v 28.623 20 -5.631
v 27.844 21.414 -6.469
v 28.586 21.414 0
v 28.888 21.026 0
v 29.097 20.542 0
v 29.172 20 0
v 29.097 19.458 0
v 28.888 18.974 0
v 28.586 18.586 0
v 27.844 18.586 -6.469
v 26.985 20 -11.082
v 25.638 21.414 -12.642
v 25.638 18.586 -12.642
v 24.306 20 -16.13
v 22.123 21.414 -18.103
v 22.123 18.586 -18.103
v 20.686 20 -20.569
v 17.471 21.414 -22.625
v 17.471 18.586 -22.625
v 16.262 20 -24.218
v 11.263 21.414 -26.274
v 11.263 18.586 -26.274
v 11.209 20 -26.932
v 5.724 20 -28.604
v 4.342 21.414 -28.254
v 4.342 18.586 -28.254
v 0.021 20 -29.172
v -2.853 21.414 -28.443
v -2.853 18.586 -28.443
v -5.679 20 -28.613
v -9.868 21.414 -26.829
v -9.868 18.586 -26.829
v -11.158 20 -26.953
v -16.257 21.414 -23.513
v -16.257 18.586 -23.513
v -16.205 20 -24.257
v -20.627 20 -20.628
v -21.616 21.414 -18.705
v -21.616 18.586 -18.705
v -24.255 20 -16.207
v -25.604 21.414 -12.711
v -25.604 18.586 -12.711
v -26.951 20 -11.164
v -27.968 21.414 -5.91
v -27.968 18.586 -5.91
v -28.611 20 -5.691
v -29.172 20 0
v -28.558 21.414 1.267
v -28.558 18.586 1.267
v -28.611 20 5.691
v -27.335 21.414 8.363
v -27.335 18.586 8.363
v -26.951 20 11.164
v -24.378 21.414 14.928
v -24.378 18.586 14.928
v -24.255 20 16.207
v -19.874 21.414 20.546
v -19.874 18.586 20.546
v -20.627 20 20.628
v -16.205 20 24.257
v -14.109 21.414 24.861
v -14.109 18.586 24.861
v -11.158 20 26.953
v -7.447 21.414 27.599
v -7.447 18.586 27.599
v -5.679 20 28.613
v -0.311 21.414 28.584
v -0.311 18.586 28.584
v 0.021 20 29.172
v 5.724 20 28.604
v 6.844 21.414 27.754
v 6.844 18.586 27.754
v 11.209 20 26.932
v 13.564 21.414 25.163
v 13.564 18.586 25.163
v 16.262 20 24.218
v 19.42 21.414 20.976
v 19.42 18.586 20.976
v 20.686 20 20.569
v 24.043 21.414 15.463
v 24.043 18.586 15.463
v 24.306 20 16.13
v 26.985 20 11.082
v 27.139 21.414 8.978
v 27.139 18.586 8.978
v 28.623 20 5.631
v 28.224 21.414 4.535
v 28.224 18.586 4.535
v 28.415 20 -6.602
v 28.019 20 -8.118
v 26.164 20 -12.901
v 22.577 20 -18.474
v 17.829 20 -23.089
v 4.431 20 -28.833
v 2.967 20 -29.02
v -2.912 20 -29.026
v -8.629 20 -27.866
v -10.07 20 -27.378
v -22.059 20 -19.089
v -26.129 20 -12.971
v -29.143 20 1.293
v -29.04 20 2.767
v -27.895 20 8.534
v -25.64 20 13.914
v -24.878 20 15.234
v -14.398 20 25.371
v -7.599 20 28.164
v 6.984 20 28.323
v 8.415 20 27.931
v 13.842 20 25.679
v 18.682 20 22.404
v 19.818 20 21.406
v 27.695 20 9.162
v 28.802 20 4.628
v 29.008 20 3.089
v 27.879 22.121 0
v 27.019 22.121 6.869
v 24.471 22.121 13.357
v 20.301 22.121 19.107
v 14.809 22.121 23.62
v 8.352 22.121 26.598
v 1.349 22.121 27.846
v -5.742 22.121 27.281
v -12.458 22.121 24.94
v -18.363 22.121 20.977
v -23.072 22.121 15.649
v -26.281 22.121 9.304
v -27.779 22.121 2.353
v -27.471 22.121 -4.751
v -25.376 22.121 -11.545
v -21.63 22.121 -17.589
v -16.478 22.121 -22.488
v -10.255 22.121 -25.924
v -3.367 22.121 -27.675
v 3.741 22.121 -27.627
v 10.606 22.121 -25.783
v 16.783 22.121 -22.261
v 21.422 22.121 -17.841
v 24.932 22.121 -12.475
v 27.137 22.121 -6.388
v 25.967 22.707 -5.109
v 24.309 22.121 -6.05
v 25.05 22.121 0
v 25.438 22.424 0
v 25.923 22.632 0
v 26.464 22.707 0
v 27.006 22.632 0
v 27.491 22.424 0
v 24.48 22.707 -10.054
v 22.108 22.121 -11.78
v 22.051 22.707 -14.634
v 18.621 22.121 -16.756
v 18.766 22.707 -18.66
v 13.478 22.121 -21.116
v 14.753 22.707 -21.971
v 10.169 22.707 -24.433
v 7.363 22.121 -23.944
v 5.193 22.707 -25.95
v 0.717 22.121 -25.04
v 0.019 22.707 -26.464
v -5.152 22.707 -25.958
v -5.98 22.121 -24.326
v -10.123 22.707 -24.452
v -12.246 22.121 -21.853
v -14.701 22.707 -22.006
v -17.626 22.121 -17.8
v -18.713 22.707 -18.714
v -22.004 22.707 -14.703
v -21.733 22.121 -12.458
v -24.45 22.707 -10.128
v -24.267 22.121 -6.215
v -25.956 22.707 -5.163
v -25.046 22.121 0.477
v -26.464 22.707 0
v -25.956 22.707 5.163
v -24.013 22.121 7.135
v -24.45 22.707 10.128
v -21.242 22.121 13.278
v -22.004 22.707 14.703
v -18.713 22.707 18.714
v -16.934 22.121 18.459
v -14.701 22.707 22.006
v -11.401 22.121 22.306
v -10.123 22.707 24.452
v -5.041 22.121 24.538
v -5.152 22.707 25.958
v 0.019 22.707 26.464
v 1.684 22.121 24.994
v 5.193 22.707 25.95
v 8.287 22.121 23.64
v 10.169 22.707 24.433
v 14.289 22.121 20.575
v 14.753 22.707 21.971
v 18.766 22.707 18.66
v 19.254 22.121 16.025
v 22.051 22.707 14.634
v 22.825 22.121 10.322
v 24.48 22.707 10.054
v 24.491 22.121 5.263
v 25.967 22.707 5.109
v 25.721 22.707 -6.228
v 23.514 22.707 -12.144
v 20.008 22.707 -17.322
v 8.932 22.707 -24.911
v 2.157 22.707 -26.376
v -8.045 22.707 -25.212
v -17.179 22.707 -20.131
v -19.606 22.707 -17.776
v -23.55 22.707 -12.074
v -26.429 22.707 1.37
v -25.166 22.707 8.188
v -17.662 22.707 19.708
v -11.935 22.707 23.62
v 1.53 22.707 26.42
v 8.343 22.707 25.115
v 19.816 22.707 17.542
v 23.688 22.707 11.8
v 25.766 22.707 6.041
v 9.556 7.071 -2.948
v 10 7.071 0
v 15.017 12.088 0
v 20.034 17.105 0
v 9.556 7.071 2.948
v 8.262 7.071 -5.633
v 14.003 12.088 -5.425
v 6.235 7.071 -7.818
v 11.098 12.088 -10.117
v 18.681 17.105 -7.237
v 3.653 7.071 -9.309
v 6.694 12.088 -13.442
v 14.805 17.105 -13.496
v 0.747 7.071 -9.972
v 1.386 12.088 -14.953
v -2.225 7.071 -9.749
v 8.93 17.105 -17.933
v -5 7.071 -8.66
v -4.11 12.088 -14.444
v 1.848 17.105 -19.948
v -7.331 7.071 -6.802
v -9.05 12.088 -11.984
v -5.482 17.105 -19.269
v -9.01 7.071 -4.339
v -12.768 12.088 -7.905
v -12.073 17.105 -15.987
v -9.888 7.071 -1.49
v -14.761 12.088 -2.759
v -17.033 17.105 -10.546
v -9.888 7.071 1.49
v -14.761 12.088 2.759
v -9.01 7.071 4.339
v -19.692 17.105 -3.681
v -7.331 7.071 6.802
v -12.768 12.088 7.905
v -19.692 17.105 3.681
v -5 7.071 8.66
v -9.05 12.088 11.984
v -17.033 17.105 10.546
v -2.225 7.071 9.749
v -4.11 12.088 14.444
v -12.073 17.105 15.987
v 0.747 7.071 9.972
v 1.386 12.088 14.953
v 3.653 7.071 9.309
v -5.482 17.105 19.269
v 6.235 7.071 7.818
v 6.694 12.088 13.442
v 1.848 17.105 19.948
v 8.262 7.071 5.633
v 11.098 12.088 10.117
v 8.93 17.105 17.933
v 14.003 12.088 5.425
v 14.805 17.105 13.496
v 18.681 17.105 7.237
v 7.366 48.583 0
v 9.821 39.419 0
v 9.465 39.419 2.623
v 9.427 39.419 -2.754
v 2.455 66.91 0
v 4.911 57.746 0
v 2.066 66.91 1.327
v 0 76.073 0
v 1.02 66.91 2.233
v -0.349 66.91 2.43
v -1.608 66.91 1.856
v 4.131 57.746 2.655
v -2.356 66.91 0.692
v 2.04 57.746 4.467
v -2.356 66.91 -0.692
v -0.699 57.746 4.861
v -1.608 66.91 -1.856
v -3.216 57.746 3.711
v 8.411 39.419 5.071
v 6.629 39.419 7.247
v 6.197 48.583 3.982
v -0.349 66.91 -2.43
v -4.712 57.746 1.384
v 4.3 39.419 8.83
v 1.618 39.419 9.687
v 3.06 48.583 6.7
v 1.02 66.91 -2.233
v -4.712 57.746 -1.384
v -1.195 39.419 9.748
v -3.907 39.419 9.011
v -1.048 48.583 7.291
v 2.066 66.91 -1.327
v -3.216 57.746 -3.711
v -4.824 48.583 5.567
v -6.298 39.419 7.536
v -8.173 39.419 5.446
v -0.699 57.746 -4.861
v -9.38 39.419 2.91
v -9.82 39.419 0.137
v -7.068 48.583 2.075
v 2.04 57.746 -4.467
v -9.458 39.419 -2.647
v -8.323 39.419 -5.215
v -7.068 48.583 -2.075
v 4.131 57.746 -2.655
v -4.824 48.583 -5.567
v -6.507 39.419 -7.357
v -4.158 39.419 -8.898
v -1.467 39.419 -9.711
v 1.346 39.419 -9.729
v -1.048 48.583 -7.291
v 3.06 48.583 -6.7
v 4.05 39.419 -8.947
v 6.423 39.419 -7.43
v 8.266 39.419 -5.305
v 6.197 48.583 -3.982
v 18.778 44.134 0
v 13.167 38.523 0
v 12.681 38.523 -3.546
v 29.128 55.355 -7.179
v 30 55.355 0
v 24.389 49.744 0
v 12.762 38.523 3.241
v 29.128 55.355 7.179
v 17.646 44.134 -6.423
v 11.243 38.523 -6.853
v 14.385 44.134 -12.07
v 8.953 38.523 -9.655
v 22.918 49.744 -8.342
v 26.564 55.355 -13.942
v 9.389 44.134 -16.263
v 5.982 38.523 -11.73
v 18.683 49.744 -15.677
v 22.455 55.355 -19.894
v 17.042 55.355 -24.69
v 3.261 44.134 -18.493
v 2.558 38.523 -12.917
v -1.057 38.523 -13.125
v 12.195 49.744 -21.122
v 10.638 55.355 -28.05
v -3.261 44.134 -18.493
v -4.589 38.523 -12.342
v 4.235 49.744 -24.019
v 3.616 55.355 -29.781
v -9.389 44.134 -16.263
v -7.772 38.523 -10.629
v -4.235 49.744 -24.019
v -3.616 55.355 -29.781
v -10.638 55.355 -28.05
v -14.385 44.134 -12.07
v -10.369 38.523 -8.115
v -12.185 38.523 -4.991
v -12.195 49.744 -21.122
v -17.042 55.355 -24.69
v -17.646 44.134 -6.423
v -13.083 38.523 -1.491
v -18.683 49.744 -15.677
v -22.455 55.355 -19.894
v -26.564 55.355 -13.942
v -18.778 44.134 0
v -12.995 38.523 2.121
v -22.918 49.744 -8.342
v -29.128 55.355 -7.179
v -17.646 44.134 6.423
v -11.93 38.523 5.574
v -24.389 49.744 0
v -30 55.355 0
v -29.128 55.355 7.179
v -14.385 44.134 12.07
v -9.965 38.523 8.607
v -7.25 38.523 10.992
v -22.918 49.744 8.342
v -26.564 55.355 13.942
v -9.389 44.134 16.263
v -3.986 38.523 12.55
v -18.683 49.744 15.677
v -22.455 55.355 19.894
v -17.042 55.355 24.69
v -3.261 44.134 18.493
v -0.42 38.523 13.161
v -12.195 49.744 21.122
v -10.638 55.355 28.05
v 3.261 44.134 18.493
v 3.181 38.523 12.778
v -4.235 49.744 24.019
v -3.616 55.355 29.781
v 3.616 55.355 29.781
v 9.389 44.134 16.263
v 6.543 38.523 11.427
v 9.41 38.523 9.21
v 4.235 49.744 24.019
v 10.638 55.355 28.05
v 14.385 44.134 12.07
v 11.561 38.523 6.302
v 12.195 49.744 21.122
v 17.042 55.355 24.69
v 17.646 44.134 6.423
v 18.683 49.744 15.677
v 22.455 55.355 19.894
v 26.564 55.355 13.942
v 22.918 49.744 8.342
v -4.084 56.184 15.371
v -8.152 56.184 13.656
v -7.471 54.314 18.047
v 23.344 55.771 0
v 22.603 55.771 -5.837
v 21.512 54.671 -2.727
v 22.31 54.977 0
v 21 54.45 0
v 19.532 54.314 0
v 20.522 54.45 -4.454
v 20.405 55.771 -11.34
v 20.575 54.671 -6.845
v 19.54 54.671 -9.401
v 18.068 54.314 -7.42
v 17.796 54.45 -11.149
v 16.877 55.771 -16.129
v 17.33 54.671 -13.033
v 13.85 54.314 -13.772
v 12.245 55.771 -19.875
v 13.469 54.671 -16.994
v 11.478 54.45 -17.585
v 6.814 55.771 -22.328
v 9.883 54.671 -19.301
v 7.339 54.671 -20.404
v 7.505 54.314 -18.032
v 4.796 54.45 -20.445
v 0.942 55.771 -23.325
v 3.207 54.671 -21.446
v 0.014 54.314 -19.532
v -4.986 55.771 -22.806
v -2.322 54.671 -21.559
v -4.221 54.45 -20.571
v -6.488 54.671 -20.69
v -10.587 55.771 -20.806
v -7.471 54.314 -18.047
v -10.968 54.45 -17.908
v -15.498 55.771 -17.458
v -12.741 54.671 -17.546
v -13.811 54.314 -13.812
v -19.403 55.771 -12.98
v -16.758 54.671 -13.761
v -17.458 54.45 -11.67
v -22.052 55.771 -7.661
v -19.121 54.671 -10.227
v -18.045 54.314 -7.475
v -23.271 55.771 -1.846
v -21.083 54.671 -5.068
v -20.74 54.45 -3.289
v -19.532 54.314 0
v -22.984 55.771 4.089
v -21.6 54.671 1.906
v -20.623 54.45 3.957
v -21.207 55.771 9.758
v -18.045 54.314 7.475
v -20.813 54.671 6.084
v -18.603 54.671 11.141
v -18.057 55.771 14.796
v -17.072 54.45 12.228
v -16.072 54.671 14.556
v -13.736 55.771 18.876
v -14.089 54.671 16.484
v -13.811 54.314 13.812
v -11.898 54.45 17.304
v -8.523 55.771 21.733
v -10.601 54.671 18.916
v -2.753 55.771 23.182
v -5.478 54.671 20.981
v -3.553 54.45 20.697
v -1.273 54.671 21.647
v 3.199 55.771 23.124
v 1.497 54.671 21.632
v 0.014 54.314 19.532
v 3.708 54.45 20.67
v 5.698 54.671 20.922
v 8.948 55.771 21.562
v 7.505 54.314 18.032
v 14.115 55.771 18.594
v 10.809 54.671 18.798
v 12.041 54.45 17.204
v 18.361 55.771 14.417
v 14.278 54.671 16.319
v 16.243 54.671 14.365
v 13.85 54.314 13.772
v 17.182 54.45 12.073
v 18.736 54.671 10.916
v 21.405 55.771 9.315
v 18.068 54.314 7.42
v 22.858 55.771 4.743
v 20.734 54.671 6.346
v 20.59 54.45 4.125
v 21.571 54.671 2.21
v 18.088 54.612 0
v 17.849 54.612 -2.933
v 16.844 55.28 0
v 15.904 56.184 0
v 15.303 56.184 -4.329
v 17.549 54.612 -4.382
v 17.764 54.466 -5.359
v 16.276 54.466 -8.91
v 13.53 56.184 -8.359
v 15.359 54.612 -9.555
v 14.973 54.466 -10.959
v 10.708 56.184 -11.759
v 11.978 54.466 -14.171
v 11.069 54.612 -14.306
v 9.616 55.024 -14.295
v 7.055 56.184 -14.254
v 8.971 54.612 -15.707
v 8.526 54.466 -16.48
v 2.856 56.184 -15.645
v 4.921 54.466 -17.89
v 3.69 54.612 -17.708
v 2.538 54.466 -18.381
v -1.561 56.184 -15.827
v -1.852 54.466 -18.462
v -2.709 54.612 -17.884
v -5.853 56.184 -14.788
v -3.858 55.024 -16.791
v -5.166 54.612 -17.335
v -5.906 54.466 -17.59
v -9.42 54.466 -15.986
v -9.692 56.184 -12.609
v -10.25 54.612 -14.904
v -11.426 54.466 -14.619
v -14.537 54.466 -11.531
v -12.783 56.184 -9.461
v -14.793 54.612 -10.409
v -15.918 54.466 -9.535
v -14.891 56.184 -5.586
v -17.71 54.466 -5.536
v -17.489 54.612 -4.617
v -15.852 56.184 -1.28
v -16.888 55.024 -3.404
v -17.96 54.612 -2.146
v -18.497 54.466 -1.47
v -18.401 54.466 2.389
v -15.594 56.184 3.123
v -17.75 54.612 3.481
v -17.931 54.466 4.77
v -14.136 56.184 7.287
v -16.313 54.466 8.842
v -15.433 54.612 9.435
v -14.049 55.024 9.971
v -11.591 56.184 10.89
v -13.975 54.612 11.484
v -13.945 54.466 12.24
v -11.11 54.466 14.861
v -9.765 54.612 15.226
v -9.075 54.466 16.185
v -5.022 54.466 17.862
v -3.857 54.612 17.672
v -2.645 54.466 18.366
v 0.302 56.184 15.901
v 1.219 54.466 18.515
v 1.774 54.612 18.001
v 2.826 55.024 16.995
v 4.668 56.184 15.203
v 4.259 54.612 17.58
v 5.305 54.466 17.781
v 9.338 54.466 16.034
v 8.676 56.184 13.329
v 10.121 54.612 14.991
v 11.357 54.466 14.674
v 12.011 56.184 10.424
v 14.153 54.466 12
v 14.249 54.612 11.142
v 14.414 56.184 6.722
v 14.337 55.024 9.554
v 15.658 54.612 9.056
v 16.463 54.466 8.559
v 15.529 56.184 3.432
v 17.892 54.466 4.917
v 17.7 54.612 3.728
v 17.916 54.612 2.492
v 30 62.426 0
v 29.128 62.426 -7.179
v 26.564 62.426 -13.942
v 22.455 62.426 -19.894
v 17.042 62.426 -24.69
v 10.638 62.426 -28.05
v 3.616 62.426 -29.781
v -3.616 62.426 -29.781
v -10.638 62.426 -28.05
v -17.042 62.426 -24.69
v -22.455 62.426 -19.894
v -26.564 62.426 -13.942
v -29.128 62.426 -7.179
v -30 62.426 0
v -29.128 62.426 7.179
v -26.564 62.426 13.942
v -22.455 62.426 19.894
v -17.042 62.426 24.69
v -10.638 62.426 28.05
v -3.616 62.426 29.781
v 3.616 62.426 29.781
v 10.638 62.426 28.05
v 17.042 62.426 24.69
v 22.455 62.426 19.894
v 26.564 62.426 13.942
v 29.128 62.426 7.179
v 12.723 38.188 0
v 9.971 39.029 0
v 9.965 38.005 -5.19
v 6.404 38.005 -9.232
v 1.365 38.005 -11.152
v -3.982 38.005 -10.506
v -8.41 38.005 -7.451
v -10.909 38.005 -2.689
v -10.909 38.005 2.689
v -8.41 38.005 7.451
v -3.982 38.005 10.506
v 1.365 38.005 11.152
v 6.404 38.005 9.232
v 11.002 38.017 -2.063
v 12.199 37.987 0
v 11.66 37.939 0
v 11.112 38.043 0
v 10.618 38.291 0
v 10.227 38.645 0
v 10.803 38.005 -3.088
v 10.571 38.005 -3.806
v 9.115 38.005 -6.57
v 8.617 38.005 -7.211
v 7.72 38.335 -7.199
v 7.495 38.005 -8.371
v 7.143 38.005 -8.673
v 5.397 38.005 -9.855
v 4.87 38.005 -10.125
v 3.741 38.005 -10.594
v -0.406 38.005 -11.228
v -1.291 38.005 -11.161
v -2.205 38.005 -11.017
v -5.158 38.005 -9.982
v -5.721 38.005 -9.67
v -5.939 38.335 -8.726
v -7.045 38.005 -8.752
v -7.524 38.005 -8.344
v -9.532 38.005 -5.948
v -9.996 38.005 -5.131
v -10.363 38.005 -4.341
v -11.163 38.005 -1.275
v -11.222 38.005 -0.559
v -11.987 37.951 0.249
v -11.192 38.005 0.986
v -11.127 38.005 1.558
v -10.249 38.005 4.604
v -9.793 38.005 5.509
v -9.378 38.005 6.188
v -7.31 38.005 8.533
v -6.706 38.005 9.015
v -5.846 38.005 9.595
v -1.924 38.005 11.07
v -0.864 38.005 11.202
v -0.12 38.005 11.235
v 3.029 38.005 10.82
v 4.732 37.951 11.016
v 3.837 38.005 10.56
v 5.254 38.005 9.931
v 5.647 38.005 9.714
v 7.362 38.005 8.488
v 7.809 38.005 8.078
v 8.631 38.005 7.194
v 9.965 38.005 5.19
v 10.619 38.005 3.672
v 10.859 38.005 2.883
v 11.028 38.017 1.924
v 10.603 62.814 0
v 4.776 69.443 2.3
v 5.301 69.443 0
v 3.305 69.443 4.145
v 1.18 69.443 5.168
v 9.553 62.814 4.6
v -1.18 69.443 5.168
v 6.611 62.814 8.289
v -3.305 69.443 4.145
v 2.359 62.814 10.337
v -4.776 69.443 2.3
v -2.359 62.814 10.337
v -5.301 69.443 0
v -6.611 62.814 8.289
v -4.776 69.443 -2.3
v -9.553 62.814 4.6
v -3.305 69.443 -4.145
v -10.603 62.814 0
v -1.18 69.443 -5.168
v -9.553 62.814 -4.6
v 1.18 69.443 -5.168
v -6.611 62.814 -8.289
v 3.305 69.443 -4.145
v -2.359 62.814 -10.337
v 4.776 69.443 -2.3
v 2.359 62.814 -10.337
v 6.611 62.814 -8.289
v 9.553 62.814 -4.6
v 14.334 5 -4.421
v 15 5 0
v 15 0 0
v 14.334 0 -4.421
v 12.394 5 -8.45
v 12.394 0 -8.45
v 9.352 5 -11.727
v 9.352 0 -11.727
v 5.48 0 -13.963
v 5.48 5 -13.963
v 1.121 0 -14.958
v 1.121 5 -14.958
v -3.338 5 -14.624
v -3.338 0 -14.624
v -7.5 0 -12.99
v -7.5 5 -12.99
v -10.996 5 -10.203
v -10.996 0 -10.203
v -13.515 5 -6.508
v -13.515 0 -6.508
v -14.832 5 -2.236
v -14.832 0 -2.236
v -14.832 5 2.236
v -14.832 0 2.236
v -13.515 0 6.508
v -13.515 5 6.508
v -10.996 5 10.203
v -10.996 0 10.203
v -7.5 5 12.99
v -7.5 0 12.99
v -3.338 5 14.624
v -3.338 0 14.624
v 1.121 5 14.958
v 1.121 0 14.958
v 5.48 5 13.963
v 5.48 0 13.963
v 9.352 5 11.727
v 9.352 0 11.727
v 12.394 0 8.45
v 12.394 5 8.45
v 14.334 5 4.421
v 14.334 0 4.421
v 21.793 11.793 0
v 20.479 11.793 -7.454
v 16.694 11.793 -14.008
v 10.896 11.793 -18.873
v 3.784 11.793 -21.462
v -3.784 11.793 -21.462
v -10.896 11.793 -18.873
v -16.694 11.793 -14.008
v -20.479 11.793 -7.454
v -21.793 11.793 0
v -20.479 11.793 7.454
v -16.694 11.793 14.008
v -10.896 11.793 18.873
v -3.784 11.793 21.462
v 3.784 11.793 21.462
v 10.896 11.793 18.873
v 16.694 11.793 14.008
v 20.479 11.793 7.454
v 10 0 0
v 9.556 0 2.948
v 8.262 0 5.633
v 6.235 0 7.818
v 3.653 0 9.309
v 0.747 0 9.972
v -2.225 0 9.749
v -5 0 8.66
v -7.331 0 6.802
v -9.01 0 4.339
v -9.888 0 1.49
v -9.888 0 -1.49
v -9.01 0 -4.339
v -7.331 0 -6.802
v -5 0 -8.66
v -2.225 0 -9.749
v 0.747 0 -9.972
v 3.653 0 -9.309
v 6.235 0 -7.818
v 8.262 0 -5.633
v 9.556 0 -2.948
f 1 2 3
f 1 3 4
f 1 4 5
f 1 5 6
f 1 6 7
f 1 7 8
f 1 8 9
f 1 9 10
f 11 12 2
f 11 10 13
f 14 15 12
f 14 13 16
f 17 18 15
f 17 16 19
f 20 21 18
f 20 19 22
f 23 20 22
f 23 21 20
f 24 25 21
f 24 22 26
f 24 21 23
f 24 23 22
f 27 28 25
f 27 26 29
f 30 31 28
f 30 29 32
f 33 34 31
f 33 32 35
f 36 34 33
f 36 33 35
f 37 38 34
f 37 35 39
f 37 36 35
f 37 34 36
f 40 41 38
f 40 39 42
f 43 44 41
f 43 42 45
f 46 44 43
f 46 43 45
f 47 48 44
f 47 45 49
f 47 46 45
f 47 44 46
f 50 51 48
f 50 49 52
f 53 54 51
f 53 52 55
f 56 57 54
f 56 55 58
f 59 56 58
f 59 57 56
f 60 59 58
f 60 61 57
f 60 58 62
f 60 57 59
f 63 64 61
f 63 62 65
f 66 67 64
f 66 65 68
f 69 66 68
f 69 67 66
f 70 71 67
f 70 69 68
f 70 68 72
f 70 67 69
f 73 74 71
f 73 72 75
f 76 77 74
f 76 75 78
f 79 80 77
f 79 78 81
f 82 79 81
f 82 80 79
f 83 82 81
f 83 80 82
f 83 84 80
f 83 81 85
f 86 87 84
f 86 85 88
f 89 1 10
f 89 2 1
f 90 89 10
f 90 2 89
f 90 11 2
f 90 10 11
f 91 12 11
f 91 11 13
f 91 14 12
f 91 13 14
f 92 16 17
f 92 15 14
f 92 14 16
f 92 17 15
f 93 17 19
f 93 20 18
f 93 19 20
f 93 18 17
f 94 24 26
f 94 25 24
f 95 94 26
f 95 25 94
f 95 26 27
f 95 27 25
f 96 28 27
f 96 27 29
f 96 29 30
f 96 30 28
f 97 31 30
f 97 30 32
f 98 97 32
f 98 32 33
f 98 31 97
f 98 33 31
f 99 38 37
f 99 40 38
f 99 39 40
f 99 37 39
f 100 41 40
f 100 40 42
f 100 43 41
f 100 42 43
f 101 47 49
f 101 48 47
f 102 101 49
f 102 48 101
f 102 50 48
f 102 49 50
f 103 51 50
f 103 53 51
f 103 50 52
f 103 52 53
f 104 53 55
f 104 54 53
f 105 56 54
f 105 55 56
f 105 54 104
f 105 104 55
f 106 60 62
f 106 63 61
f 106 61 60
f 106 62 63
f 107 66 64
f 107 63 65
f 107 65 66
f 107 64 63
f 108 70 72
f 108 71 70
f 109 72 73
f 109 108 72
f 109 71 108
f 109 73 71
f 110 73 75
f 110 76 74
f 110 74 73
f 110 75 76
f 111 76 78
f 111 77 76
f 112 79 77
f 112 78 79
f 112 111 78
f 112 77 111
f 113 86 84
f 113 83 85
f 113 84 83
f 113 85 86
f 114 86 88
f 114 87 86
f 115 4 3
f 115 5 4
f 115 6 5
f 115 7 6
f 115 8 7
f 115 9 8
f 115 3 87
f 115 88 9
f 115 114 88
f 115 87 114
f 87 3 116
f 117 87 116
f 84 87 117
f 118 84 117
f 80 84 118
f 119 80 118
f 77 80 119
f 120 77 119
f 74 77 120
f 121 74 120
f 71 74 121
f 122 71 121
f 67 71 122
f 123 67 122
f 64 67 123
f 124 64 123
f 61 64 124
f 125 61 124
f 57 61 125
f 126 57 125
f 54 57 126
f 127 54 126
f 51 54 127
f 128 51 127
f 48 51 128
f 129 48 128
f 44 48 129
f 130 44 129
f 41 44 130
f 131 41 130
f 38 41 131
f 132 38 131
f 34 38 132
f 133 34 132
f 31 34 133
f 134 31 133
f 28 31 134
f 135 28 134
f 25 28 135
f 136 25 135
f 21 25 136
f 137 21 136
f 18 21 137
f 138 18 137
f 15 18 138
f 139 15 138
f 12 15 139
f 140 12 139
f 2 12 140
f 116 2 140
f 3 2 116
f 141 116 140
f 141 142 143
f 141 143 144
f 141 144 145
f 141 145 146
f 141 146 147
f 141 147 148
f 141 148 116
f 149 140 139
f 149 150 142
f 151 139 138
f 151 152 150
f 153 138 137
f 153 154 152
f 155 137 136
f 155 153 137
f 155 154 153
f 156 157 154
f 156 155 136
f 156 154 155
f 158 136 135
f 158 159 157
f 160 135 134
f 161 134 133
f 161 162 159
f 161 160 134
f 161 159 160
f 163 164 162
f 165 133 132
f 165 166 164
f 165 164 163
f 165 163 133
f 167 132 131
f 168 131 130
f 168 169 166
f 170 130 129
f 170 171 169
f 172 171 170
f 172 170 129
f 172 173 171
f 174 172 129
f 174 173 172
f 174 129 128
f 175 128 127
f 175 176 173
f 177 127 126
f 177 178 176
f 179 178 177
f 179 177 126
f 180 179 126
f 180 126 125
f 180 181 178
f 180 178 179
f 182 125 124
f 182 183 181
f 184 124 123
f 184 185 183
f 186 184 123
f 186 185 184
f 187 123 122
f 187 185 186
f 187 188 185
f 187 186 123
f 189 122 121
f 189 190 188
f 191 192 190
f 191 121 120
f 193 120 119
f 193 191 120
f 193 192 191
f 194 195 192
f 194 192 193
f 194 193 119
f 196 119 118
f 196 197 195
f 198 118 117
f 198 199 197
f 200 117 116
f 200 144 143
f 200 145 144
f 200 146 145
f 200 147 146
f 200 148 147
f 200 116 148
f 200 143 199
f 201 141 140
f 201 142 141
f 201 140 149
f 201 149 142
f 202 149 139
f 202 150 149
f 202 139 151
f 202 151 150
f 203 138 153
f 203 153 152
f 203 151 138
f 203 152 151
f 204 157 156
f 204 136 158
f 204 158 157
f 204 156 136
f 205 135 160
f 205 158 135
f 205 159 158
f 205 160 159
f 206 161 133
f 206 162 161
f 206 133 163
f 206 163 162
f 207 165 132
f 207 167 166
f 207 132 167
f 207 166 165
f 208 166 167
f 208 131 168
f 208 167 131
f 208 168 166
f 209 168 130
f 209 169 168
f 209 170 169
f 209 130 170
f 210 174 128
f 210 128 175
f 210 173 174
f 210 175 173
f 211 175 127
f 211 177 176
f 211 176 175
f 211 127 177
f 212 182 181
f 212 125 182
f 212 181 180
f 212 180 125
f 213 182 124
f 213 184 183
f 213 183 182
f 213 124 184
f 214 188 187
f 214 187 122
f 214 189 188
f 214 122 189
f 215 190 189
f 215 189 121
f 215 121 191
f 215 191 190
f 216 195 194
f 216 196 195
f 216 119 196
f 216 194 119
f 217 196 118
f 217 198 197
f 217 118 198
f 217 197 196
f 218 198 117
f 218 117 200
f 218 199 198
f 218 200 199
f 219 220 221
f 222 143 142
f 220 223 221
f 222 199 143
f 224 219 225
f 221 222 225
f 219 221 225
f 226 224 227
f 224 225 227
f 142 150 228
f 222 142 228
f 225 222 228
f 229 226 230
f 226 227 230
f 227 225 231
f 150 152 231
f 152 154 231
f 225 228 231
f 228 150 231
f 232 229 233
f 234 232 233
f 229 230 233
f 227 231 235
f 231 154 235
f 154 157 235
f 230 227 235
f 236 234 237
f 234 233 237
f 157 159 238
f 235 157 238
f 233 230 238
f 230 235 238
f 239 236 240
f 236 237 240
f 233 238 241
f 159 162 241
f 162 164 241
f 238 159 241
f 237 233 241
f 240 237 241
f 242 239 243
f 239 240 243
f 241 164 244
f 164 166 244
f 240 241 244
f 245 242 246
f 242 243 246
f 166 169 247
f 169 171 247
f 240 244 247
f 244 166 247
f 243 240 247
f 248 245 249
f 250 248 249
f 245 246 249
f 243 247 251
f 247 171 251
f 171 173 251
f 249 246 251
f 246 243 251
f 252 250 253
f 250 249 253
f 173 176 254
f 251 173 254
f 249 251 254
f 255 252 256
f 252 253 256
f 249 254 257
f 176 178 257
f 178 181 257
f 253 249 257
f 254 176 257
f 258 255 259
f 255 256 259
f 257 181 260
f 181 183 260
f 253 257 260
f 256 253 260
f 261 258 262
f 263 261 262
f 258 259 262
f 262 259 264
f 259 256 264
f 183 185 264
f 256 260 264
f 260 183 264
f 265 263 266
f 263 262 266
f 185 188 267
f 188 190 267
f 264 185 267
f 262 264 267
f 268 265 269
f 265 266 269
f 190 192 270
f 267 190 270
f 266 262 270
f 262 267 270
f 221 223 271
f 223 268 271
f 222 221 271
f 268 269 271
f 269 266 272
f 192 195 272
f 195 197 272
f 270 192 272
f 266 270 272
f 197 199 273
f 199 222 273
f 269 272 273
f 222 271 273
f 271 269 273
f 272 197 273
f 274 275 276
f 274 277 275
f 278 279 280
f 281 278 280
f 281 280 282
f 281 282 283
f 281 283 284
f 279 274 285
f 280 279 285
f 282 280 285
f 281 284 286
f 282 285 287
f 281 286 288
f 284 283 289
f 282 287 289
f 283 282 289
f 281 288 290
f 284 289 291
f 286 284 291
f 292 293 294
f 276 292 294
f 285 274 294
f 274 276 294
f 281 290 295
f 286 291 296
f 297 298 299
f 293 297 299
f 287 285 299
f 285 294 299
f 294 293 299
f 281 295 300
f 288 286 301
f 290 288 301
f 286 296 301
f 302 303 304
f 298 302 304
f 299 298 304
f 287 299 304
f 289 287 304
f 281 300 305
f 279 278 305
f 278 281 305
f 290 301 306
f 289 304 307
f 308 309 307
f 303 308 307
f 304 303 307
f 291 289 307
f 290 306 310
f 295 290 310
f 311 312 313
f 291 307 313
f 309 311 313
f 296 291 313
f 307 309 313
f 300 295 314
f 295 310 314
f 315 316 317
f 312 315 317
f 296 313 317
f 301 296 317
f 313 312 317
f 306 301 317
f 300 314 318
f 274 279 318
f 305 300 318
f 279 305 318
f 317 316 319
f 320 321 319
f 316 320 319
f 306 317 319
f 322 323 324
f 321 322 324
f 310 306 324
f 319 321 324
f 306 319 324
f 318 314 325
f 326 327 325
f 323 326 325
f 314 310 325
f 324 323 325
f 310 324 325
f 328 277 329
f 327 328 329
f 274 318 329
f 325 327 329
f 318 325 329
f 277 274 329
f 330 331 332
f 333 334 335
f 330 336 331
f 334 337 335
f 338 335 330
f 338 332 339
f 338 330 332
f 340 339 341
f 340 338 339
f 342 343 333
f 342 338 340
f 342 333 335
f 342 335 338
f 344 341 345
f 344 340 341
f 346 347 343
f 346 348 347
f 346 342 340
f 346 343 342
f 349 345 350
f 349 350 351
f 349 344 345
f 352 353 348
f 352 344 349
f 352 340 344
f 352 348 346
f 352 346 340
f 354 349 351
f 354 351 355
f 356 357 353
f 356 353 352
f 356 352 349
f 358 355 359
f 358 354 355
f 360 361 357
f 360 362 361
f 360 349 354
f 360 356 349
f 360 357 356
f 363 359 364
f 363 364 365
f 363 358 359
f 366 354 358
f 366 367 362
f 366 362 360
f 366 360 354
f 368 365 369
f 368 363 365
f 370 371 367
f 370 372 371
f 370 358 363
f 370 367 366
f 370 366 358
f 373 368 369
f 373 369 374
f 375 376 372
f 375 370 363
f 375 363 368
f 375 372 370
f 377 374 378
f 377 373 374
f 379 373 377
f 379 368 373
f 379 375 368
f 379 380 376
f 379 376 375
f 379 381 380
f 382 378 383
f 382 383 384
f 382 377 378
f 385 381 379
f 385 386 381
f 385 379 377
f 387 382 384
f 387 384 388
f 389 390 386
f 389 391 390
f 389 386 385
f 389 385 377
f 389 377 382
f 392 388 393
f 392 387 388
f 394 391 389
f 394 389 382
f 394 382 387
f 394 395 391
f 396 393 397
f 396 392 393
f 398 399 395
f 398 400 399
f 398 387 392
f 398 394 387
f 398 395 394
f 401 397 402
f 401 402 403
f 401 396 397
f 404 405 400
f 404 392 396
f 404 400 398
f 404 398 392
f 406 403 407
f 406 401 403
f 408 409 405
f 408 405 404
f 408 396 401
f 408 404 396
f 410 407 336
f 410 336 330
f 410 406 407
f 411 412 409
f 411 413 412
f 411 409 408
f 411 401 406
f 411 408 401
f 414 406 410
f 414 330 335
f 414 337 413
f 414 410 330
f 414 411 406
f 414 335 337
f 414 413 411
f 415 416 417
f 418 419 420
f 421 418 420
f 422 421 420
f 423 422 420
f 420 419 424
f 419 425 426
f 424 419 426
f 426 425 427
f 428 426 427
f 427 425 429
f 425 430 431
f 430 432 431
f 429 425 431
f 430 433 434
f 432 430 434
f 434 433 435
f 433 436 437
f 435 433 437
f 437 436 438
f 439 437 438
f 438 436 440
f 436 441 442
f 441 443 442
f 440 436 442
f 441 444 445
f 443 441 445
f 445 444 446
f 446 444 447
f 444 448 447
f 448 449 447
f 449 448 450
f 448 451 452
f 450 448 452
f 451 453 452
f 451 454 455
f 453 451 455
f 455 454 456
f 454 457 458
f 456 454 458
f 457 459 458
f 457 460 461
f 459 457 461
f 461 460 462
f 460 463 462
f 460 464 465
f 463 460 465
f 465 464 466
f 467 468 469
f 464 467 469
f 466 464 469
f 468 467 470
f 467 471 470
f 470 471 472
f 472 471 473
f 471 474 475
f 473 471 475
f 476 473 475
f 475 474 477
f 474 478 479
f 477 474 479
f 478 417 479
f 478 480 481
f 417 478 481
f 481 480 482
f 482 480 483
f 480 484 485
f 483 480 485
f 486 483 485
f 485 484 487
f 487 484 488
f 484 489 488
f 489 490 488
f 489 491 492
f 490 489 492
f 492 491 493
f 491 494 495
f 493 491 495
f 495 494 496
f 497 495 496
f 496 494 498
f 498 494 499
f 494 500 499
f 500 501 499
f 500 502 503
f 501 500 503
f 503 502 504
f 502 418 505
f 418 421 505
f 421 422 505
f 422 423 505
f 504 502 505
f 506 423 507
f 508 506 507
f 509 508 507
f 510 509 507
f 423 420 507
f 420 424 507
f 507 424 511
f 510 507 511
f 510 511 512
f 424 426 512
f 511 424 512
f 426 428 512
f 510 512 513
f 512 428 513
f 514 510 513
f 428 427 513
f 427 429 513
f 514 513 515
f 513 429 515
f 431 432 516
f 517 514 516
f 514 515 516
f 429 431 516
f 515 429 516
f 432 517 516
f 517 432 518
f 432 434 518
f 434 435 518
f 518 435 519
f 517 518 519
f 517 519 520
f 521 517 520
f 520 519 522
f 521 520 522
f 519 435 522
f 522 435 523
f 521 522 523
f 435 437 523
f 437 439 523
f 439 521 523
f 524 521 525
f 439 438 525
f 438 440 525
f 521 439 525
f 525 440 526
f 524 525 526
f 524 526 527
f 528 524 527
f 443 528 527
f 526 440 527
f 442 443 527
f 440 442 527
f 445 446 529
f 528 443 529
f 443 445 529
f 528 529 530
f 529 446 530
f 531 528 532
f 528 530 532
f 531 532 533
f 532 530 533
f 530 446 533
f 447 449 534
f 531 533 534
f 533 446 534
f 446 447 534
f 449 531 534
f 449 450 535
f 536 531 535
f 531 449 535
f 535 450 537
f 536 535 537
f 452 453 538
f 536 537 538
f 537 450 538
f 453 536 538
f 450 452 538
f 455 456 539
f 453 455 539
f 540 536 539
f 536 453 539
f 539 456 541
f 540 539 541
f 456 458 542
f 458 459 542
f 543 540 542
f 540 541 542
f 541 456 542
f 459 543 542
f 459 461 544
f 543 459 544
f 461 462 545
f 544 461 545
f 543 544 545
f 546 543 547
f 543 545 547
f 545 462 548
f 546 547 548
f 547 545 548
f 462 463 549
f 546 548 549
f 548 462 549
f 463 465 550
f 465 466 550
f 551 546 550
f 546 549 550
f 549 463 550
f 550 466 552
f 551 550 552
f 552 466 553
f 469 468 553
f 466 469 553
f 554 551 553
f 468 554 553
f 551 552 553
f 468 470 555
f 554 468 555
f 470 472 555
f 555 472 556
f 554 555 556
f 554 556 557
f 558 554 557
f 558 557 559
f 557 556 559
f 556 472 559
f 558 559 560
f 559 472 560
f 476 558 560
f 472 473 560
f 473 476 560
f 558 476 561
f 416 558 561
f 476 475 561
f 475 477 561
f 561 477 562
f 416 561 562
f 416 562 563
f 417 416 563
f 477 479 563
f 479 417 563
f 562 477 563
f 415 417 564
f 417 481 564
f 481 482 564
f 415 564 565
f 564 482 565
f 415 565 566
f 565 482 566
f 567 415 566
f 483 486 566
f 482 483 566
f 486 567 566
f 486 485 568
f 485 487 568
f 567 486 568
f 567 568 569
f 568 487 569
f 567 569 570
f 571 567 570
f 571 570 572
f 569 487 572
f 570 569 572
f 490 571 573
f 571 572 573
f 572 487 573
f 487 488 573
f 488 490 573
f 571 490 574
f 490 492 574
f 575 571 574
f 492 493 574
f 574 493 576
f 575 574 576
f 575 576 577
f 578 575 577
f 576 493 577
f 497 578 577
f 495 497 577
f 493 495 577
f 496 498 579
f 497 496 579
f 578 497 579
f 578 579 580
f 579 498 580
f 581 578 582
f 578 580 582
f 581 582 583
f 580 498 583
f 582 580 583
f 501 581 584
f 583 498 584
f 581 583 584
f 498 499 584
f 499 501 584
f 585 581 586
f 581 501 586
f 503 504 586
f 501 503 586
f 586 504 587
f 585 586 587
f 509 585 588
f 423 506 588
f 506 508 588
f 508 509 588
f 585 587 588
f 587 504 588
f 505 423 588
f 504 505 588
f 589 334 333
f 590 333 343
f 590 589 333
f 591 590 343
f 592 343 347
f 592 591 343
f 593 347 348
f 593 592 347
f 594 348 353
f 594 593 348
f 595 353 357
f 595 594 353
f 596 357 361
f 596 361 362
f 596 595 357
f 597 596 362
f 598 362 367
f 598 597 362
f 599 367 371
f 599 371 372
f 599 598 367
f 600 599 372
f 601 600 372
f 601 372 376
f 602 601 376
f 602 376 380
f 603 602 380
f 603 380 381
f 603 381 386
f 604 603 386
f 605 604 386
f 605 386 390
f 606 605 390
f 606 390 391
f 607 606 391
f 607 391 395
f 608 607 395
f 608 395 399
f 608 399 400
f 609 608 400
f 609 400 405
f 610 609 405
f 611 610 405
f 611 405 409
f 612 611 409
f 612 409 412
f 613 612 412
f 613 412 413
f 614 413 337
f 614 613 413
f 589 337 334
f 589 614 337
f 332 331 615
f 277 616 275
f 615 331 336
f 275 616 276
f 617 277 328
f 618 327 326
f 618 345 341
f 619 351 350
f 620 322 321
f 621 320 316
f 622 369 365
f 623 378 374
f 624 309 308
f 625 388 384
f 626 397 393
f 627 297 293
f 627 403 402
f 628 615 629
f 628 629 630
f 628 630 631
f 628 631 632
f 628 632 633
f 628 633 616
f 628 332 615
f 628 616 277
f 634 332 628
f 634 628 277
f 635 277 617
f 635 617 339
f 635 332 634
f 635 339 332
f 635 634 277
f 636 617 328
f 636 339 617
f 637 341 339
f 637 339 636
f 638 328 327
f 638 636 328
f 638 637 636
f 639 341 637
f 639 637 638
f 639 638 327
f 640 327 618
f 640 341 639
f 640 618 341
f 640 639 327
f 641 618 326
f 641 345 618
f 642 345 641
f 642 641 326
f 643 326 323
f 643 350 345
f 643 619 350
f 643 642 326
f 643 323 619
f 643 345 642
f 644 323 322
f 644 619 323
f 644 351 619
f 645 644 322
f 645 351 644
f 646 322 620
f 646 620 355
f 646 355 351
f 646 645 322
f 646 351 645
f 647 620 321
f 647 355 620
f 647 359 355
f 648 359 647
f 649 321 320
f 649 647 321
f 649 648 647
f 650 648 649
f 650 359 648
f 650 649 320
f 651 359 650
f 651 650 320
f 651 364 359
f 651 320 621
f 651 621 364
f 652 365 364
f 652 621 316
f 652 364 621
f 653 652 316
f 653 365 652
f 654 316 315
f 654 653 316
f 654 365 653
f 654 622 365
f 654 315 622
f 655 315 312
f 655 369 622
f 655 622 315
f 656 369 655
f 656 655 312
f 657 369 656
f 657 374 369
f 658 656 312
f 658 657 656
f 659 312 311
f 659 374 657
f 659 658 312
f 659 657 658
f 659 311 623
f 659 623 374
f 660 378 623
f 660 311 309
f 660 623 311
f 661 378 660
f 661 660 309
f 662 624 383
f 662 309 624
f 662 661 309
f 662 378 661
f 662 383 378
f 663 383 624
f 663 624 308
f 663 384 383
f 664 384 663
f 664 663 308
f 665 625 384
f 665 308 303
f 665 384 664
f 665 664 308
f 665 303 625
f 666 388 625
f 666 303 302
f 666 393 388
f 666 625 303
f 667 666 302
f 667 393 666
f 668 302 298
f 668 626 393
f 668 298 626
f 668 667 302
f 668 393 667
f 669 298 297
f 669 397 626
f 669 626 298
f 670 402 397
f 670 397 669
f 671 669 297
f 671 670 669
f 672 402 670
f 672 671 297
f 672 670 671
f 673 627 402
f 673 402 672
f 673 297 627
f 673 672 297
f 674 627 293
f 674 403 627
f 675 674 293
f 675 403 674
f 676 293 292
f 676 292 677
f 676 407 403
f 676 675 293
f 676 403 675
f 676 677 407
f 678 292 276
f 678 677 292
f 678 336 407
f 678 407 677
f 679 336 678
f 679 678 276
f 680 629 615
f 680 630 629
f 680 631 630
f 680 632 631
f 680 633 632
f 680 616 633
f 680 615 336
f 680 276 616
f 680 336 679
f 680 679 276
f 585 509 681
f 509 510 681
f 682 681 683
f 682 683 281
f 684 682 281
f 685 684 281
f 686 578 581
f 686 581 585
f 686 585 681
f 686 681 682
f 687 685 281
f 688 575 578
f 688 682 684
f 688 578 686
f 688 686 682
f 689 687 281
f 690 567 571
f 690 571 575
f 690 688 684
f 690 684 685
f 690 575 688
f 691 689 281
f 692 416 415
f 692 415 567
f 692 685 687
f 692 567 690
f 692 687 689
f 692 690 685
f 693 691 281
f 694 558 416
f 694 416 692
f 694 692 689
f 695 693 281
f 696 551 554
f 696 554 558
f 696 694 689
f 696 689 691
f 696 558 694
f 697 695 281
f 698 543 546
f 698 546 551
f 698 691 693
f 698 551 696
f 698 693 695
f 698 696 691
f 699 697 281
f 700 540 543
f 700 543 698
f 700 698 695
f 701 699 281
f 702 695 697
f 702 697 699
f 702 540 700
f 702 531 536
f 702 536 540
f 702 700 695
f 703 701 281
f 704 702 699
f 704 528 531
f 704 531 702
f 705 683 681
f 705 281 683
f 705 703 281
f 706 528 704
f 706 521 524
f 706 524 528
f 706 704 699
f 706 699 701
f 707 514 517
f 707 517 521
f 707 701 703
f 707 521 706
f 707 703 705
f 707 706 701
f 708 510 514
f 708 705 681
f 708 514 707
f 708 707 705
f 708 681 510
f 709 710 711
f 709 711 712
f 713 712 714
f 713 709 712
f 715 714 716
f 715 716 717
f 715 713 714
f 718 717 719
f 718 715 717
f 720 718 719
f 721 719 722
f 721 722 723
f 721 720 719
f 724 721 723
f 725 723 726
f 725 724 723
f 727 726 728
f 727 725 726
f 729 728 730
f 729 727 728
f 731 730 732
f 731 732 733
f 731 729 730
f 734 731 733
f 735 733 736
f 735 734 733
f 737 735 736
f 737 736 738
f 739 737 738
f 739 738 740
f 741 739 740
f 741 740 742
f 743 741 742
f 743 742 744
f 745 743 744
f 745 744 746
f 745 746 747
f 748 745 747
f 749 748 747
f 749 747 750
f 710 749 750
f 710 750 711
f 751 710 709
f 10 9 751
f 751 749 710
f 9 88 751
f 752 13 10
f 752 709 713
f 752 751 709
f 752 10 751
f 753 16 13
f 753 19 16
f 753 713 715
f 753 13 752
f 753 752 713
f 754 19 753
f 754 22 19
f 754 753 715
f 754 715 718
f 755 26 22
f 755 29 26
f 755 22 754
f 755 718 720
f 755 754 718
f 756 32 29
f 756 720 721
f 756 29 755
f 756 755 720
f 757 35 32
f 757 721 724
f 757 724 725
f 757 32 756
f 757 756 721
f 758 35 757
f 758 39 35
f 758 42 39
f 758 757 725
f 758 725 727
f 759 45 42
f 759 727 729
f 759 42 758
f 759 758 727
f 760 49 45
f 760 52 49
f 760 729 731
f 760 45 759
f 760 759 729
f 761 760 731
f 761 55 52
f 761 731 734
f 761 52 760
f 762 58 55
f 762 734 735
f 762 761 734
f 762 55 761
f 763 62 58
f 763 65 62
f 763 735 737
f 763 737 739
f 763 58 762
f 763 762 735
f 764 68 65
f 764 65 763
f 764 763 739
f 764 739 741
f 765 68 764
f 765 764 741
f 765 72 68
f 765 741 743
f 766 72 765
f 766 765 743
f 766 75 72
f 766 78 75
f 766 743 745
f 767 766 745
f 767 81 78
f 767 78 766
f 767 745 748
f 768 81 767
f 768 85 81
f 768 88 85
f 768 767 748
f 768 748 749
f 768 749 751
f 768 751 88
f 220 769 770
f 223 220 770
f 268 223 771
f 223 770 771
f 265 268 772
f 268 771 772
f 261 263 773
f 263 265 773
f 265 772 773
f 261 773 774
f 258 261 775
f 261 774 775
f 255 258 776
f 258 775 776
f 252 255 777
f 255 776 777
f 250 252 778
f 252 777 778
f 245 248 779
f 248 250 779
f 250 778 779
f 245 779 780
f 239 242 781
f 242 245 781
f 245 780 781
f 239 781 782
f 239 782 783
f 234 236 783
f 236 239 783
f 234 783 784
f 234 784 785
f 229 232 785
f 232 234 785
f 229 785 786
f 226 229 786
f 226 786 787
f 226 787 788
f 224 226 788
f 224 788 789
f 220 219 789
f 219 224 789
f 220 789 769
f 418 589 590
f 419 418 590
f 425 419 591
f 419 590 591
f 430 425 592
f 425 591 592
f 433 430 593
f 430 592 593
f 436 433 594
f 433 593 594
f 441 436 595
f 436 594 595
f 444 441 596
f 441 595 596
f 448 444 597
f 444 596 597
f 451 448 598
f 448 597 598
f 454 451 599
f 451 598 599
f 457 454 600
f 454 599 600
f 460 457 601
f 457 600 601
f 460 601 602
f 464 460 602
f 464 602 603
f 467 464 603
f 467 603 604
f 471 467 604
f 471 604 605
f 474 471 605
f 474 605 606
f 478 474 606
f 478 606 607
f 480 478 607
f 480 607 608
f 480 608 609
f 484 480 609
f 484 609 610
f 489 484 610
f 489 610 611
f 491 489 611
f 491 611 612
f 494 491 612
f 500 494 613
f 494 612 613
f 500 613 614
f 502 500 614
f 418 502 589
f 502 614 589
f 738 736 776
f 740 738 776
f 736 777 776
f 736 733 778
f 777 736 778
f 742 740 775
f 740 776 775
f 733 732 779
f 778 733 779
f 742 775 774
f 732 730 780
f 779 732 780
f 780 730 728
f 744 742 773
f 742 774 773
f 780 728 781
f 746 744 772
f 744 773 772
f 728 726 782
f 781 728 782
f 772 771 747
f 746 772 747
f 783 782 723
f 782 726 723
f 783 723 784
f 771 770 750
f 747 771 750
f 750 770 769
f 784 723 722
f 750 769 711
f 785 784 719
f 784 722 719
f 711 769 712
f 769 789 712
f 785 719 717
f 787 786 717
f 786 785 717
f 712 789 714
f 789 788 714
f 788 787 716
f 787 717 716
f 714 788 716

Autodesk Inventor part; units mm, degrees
ref_plane "YZ Plane" through (0, 0, 0) normal (1, 0, 0) x (0, 1, 0)
ref_plane "XZ Plane" through (0, 0, 0) normal (0, 1, 0) x (-1, 0, 0)
ref_plane "XY Plane" through (0, 0, 0) normal (0, 0, 1) x (1, 0, 0)
sketch "Sketch1" plane through (0, 0, 0) normal (0, 0, 1) x (1, 0, 0)
  line L0 (10, 0) -> (15, 0)
  line L1 (15, 0) -> (15, 5)
  line L2 (15, 5) -> (30, 20)
  line L3 (30, 20) -> (26.4645, 23.5355)
  line L4 (26.4645, 23.5355) -> (10, 7.0711)
  line L5 (10, 7.0711) -> (10, 0)
  line L6 (30, 55.3553) -> (10.718, 36.0733)
  line L7 (10.718, 36.0733) -> (0, 76.0733)
  line L8 (0, 0) -> (0, 76.0733)
  line L9 (30, 55.3553) -> (30, 62.4264)
  line L10 (30, 62.4264) -> (19.3934, 51.8198)
  line L11 (19.3934, 51.8198) -> (0, 76.0733)
  dimension "d0" = 45
  dimension "d1" = 20
  dimension "d2" = 5
  dimension "d3" = 5
  dimension "d4" = 5
  dimension "d5" = 15
  dimension "d7" = 20
  dimension "d8" = 60
  dimension "d9" = 5
  dimension "d10" = 15
  dimension "d14" = 40
revolve "Revolution1" add sketch "Sketch1" angle 360 about axis through (0, 0, 0) along (0, 1, 0)
fillet "Fillet1" radius 2 3 edges at (-30, 20, 0) (-26.4645, 23.5355, 0) (-10.718, 36.0733, 0)
fillet "Fillet2" radius 5 1 edges at (-19.3934, 51.8198, 0)
equation "\"d4\" = d2"
equation "\"d7\" = d1"
equation "\"d9\" = d2"
properties part number "player"
